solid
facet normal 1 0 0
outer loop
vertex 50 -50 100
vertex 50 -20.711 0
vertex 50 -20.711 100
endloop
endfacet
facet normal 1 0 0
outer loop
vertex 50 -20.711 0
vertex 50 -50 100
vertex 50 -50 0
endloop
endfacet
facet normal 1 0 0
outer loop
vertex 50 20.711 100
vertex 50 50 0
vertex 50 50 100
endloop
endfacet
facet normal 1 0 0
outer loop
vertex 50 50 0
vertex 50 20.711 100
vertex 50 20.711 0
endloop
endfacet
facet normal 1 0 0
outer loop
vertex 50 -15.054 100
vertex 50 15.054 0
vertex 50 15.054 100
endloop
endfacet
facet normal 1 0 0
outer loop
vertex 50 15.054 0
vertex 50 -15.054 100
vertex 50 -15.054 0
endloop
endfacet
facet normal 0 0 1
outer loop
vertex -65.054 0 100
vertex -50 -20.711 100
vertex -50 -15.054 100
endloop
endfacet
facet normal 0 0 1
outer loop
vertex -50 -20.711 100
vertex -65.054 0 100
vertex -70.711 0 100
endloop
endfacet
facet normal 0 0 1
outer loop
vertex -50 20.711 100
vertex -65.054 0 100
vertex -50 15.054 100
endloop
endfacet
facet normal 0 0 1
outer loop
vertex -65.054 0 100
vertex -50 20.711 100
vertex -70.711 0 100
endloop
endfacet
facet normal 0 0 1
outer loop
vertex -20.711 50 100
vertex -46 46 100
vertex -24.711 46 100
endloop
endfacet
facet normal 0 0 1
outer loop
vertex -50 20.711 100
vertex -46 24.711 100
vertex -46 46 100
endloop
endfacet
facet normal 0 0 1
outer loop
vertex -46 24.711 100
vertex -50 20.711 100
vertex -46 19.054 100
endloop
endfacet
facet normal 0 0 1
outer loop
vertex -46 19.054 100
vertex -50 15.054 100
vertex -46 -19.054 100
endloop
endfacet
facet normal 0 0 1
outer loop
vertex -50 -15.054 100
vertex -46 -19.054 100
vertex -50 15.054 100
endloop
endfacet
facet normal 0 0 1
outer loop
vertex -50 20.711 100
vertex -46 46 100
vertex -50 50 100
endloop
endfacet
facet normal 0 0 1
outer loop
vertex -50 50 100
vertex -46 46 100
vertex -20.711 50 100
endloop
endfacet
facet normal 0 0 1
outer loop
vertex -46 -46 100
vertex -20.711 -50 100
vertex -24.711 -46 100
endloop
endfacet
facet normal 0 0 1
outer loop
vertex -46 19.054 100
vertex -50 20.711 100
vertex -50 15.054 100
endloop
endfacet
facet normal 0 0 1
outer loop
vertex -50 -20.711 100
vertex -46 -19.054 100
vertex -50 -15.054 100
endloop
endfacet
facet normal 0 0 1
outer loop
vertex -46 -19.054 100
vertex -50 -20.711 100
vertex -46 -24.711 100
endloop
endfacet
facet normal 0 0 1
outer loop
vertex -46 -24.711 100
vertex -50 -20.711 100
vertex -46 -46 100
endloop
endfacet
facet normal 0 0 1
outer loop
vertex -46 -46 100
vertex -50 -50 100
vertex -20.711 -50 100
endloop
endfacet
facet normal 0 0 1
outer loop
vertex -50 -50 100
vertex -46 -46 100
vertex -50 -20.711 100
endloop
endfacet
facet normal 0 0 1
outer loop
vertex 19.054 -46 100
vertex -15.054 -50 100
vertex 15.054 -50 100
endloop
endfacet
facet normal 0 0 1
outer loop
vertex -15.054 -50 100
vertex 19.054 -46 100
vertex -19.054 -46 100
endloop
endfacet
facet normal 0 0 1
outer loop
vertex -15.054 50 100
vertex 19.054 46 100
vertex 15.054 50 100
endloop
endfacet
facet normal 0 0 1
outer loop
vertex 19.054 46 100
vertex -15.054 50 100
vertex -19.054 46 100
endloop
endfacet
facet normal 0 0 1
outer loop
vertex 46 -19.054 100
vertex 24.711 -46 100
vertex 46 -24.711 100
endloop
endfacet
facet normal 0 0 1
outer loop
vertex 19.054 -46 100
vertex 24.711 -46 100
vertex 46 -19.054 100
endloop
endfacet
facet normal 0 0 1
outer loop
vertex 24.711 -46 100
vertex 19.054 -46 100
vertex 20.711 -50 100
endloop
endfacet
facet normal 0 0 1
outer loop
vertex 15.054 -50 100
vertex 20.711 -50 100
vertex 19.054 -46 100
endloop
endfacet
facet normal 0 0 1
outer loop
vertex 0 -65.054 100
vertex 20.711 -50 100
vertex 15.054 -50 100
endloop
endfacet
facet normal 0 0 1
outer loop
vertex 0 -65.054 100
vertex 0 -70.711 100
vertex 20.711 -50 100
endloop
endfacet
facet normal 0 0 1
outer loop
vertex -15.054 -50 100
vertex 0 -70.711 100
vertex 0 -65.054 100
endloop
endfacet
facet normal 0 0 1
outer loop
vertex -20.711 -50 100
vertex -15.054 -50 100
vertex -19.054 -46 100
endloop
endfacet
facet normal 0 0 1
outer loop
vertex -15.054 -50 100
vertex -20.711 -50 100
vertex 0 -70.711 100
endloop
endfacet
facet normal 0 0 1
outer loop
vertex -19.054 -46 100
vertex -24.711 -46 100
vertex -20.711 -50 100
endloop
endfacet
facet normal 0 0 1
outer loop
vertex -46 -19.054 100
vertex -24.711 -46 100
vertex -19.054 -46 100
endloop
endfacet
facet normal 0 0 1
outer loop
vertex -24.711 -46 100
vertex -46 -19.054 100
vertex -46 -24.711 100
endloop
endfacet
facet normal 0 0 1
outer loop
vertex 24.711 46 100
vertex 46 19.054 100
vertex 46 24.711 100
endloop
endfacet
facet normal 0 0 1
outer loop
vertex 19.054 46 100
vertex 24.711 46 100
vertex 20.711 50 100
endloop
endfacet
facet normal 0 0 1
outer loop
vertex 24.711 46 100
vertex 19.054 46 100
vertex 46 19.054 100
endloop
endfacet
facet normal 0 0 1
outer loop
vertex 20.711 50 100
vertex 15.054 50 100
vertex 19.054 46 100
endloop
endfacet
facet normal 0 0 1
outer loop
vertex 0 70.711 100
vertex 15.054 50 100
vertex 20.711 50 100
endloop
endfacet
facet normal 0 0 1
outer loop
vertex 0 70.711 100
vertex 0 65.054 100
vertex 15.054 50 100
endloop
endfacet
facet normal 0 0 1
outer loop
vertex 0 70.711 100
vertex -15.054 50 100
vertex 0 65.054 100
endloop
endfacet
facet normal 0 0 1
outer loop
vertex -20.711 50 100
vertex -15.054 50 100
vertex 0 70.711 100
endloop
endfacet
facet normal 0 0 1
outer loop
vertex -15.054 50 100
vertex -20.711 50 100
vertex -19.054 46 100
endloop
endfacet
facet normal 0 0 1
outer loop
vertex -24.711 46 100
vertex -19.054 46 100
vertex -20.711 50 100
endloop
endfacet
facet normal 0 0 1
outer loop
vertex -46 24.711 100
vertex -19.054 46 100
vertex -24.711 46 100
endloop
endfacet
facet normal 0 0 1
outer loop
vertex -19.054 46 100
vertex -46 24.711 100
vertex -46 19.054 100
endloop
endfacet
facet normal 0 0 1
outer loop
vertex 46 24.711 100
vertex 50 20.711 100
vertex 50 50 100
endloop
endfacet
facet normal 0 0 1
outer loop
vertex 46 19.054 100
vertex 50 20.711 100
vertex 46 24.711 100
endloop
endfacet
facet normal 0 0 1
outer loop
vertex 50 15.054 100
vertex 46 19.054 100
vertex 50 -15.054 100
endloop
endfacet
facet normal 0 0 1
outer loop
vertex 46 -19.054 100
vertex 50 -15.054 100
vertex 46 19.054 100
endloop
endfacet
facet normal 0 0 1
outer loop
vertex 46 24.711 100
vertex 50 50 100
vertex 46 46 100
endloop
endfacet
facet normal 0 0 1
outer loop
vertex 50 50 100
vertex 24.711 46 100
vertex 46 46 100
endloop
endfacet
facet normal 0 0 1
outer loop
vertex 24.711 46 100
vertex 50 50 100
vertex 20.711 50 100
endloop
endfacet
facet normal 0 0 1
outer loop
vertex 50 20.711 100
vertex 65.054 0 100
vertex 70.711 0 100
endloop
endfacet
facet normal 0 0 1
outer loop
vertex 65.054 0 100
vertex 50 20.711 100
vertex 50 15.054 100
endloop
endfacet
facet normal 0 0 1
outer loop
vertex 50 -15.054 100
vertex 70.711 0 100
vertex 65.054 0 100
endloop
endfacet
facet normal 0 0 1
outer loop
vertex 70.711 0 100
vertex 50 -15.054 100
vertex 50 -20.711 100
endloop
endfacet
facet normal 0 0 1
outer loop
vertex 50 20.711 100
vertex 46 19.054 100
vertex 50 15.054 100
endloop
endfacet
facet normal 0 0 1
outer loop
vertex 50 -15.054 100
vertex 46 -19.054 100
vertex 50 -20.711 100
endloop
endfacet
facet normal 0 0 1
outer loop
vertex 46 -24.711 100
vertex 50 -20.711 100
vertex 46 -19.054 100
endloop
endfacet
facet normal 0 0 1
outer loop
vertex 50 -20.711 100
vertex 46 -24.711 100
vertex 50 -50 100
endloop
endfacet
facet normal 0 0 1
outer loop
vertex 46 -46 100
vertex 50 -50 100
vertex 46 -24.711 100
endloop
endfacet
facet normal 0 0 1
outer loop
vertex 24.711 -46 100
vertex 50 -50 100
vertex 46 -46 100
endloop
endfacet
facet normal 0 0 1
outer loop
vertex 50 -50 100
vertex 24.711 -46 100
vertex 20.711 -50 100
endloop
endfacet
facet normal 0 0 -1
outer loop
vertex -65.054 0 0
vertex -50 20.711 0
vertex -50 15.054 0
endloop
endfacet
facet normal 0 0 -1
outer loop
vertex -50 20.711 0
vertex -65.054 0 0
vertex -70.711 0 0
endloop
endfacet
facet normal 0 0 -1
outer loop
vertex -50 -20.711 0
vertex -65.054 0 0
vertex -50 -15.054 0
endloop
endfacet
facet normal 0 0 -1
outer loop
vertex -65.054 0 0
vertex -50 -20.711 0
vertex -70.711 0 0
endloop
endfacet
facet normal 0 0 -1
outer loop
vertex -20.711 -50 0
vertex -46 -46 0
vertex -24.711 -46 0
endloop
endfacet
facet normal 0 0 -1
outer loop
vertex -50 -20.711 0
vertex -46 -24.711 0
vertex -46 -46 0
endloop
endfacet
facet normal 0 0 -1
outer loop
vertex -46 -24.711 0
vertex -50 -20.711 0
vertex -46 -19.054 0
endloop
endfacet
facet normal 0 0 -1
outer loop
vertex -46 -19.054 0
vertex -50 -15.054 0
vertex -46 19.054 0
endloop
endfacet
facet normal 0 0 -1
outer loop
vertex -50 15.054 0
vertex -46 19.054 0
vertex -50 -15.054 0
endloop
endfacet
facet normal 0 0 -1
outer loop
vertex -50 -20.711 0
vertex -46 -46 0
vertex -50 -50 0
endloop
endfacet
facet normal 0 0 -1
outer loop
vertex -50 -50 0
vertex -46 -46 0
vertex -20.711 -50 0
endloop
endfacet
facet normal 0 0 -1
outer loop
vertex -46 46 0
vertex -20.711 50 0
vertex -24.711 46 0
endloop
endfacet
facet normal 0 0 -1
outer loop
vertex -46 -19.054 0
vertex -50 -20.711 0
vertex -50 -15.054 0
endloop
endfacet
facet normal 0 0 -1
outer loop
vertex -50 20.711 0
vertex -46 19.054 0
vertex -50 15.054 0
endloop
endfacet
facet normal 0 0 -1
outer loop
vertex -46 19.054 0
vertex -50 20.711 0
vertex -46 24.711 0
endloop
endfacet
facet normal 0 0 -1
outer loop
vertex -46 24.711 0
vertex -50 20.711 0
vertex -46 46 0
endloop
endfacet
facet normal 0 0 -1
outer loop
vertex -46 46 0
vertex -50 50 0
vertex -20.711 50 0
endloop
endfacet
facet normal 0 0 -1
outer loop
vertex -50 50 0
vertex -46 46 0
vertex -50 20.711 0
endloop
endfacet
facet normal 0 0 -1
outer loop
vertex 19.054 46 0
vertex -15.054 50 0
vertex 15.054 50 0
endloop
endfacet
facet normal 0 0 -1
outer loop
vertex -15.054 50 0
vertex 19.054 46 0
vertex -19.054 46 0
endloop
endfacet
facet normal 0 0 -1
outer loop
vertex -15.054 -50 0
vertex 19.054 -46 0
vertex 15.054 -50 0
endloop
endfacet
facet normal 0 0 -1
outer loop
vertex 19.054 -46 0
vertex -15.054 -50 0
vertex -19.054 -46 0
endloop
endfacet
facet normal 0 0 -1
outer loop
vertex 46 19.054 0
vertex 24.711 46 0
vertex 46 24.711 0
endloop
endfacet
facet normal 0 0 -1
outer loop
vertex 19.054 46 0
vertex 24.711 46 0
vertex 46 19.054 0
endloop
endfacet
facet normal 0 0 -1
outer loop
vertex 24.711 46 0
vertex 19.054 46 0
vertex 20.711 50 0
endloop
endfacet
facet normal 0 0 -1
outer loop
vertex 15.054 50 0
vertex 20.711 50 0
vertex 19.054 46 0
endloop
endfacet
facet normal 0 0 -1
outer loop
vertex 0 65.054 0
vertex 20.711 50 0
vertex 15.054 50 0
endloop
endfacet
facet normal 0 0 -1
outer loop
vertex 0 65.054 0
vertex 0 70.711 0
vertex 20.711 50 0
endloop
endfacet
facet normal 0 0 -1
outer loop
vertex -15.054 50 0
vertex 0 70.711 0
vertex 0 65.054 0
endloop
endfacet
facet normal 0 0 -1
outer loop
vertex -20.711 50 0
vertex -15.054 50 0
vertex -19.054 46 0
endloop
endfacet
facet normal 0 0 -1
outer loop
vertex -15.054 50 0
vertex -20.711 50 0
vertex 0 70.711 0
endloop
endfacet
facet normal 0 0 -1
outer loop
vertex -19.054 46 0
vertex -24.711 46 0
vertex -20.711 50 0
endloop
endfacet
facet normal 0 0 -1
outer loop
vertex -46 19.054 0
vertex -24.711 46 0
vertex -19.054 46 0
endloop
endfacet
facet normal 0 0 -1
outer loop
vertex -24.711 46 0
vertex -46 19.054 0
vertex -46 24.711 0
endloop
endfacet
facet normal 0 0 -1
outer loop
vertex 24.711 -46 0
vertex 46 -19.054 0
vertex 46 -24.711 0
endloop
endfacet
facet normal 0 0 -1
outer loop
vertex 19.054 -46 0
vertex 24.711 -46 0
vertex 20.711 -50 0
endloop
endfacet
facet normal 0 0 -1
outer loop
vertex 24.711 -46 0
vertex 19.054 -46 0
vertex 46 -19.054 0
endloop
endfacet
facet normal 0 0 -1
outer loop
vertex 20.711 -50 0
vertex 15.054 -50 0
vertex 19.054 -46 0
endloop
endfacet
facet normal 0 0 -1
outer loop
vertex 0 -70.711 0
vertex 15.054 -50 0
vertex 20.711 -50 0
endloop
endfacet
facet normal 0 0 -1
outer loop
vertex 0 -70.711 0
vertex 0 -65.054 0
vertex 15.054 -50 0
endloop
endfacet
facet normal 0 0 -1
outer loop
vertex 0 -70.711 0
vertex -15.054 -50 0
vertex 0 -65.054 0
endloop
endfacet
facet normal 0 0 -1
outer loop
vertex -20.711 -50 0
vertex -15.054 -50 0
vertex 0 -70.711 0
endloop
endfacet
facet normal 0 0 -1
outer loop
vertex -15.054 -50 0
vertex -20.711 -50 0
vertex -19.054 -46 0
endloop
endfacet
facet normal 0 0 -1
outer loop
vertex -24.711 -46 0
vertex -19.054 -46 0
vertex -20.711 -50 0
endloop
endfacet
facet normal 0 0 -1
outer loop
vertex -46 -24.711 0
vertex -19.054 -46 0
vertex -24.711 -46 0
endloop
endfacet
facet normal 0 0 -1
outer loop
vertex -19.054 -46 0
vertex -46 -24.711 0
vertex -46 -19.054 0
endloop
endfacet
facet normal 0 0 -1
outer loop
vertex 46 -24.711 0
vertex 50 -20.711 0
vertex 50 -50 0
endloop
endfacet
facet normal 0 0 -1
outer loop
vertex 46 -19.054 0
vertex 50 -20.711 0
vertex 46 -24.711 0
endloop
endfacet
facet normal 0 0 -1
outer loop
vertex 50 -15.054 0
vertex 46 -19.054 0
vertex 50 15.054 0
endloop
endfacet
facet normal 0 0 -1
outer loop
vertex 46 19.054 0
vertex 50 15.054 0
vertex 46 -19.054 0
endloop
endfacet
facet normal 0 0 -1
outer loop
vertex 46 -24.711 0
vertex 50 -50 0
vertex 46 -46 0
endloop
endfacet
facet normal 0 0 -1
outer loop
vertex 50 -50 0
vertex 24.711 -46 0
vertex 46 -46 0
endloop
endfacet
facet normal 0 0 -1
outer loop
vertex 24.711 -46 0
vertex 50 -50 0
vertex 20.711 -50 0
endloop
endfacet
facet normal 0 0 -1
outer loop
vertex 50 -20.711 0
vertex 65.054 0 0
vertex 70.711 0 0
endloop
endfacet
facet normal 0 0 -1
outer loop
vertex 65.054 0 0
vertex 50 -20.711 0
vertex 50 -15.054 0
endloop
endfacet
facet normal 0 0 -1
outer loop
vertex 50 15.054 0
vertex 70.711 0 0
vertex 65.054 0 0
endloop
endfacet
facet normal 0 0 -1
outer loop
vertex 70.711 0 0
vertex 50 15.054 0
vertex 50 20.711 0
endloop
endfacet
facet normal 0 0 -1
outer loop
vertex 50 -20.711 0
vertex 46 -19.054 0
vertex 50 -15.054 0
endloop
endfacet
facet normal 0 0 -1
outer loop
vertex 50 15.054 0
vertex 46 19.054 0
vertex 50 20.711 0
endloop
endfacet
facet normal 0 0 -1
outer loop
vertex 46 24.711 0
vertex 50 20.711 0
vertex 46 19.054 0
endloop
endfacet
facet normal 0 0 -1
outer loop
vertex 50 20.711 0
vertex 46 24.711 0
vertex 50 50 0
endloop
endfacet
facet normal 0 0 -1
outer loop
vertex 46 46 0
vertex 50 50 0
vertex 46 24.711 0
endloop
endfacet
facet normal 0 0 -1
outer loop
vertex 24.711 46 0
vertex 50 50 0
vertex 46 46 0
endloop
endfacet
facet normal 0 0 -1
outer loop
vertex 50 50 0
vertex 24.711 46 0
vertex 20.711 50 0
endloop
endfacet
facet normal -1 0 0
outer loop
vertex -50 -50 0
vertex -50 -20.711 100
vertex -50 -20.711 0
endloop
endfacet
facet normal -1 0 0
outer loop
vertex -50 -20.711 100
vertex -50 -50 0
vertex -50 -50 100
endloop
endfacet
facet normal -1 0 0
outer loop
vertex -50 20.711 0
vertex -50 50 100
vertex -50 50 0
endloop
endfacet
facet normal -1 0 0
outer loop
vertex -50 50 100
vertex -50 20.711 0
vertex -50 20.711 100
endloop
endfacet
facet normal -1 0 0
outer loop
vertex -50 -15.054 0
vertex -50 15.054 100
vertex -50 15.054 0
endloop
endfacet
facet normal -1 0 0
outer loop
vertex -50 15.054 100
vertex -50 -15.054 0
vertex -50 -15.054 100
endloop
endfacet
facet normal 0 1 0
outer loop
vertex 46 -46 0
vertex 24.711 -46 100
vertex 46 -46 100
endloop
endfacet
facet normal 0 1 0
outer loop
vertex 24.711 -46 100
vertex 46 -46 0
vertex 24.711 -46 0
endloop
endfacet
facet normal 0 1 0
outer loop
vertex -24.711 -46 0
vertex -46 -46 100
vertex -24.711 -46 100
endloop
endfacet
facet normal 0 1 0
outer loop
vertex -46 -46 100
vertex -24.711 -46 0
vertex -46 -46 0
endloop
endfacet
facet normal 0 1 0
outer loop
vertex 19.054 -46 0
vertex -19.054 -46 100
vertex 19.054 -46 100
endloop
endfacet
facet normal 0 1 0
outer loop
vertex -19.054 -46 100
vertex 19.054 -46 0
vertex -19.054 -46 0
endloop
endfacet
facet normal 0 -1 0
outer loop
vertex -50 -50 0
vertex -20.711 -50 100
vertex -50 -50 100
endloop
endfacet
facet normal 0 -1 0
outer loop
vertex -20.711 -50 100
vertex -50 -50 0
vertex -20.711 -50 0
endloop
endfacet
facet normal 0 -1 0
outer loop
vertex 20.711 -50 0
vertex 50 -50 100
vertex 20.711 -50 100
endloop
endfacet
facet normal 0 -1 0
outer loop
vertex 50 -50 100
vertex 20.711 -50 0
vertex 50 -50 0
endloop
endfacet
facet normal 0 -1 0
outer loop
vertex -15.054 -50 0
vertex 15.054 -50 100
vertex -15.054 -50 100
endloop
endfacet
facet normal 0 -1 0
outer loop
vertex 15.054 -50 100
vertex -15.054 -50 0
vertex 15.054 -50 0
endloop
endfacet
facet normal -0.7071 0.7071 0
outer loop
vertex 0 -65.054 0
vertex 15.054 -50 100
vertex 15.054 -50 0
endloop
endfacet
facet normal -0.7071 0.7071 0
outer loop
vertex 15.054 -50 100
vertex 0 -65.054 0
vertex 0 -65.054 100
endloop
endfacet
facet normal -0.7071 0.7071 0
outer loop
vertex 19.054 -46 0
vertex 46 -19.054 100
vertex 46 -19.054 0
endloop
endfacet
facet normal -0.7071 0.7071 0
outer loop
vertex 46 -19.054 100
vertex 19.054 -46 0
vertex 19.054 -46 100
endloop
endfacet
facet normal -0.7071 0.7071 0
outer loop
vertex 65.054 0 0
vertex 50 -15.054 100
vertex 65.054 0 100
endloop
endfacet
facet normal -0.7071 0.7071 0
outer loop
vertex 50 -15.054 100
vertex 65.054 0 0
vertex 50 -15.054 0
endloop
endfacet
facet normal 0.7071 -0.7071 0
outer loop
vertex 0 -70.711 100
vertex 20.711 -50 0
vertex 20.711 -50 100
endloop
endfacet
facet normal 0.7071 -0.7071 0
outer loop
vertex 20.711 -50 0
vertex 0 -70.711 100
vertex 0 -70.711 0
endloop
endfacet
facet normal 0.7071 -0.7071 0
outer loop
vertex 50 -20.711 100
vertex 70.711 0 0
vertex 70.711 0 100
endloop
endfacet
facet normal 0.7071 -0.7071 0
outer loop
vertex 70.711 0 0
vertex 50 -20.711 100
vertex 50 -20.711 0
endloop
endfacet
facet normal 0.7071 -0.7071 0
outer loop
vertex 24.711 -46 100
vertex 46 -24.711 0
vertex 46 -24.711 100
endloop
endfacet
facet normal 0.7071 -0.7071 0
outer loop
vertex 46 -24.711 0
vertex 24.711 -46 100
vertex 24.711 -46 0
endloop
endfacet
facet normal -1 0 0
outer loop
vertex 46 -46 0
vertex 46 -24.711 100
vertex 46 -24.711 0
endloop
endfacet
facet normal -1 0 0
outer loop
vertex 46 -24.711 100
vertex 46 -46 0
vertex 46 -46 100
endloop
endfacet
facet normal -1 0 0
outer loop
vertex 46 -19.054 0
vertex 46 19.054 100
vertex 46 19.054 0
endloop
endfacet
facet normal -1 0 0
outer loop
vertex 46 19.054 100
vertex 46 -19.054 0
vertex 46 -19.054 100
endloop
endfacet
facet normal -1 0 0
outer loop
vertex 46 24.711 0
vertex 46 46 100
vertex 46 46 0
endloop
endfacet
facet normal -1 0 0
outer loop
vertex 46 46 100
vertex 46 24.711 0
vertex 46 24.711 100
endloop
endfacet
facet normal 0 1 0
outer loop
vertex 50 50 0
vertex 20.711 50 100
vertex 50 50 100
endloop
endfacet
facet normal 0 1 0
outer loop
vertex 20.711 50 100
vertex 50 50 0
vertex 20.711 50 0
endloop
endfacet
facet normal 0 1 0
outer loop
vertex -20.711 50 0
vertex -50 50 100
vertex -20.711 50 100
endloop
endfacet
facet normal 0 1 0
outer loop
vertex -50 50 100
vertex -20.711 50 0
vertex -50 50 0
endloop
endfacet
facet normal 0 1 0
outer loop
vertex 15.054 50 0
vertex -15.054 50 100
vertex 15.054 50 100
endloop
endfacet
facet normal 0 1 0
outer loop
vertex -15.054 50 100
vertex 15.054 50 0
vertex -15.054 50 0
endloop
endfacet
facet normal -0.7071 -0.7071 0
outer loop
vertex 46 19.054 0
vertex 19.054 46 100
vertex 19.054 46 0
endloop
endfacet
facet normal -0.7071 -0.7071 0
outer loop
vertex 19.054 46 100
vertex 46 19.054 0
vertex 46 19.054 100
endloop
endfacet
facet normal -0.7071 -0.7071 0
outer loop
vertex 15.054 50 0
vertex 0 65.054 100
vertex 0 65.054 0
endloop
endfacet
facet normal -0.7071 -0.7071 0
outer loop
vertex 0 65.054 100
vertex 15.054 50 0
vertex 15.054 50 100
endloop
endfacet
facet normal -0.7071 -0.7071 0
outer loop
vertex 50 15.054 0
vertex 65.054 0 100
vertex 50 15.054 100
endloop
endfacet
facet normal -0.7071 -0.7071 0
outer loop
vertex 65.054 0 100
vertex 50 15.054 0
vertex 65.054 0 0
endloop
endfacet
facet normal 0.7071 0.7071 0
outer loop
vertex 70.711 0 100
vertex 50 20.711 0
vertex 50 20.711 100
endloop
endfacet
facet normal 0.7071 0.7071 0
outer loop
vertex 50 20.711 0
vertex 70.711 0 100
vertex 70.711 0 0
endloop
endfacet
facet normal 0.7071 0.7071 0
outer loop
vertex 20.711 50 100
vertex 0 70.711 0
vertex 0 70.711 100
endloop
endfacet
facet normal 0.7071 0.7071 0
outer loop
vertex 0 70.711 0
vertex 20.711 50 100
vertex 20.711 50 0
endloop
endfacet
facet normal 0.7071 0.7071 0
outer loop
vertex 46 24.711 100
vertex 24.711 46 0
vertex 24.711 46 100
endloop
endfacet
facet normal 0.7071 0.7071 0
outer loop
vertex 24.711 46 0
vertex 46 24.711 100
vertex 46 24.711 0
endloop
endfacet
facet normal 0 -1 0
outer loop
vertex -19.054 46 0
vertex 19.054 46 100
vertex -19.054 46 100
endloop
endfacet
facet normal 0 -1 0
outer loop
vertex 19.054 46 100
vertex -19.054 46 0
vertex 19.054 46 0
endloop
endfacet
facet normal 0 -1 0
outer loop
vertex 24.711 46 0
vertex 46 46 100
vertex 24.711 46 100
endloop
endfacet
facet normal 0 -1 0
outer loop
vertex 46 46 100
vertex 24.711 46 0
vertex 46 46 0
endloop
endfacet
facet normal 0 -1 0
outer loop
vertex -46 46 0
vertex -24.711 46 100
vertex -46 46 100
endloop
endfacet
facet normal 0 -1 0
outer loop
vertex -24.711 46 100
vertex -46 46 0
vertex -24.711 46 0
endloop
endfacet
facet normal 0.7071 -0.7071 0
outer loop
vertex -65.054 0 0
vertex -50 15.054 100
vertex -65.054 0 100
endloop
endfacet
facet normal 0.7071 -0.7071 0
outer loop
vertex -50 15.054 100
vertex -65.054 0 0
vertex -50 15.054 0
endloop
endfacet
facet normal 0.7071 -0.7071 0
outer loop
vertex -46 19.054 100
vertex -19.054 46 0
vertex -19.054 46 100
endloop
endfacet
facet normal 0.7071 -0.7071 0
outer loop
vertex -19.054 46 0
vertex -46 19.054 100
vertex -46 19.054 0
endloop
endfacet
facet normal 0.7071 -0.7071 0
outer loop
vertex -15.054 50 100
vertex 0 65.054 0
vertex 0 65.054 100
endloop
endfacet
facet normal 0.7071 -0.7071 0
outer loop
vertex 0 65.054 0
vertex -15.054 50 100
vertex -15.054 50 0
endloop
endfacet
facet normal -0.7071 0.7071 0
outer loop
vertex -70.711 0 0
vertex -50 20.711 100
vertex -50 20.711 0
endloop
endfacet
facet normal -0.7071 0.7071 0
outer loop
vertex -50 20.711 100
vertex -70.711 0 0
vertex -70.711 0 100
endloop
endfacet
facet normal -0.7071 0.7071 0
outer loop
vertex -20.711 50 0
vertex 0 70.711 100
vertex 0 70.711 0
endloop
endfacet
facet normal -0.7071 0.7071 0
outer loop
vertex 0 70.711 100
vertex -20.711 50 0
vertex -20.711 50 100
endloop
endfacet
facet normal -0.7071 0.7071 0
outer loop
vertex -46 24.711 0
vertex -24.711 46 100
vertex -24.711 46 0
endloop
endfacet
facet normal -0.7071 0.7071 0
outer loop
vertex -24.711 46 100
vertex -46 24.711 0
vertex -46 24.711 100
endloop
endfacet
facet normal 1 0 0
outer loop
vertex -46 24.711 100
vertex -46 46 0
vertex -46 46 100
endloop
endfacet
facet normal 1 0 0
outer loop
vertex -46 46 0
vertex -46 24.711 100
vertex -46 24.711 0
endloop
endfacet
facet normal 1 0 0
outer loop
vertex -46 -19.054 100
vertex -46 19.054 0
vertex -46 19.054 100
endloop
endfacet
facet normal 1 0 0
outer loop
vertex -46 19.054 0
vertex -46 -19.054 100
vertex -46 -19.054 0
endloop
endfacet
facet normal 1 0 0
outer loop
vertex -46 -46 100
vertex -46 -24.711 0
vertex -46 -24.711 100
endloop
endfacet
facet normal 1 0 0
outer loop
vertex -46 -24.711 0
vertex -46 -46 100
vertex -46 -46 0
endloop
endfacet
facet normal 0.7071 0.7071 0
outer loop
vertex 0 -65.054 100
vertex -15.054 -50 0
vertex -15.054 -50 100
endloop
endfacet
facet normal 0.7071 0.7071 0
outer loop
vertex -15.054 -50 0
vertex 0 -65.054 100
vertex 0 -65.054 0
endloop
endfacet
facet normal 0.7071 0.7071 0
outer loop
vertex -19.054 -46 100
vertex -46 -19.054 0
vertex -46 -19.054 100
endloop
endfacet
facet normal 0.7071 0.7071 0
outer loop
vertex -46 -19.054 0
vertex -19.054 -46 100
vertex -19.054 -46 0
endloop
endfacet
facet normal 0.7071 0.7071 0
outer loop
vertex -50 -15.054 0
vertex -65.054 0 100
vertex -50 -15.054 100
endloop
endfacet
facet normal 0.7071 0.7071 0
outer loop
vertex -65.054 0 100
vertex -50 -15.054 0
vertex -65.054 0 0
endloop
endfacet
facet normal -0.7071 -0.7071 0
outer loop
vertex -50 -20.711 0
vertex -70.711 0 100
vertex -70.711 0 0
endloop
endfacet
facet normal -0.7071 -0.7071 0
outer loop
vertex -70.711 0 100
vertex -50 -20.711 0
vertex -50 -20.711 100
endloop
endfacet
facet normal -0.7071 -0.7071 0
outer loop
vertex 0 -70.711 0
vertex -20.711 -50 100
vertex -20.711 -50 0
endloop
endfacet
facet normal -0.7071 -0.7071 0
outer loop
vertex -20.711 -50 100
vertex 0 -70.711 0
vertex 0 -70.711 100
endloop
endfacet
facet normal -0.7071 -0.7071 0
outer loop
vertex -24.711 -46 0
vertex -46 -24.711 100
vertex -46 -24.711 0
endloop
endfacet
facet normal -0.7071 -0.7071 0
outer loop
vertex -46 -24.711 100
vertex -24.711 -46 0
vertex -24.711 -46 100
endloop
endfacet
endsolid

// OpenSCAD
a = 360/8;
size      = 100;
thickness =   4;


for (i = [0:7]) {
    rotate([0, 0, i*a])
    translate([-0.5*size, -0.5*size, 0])
    cube([size, thickness, size]);
}
